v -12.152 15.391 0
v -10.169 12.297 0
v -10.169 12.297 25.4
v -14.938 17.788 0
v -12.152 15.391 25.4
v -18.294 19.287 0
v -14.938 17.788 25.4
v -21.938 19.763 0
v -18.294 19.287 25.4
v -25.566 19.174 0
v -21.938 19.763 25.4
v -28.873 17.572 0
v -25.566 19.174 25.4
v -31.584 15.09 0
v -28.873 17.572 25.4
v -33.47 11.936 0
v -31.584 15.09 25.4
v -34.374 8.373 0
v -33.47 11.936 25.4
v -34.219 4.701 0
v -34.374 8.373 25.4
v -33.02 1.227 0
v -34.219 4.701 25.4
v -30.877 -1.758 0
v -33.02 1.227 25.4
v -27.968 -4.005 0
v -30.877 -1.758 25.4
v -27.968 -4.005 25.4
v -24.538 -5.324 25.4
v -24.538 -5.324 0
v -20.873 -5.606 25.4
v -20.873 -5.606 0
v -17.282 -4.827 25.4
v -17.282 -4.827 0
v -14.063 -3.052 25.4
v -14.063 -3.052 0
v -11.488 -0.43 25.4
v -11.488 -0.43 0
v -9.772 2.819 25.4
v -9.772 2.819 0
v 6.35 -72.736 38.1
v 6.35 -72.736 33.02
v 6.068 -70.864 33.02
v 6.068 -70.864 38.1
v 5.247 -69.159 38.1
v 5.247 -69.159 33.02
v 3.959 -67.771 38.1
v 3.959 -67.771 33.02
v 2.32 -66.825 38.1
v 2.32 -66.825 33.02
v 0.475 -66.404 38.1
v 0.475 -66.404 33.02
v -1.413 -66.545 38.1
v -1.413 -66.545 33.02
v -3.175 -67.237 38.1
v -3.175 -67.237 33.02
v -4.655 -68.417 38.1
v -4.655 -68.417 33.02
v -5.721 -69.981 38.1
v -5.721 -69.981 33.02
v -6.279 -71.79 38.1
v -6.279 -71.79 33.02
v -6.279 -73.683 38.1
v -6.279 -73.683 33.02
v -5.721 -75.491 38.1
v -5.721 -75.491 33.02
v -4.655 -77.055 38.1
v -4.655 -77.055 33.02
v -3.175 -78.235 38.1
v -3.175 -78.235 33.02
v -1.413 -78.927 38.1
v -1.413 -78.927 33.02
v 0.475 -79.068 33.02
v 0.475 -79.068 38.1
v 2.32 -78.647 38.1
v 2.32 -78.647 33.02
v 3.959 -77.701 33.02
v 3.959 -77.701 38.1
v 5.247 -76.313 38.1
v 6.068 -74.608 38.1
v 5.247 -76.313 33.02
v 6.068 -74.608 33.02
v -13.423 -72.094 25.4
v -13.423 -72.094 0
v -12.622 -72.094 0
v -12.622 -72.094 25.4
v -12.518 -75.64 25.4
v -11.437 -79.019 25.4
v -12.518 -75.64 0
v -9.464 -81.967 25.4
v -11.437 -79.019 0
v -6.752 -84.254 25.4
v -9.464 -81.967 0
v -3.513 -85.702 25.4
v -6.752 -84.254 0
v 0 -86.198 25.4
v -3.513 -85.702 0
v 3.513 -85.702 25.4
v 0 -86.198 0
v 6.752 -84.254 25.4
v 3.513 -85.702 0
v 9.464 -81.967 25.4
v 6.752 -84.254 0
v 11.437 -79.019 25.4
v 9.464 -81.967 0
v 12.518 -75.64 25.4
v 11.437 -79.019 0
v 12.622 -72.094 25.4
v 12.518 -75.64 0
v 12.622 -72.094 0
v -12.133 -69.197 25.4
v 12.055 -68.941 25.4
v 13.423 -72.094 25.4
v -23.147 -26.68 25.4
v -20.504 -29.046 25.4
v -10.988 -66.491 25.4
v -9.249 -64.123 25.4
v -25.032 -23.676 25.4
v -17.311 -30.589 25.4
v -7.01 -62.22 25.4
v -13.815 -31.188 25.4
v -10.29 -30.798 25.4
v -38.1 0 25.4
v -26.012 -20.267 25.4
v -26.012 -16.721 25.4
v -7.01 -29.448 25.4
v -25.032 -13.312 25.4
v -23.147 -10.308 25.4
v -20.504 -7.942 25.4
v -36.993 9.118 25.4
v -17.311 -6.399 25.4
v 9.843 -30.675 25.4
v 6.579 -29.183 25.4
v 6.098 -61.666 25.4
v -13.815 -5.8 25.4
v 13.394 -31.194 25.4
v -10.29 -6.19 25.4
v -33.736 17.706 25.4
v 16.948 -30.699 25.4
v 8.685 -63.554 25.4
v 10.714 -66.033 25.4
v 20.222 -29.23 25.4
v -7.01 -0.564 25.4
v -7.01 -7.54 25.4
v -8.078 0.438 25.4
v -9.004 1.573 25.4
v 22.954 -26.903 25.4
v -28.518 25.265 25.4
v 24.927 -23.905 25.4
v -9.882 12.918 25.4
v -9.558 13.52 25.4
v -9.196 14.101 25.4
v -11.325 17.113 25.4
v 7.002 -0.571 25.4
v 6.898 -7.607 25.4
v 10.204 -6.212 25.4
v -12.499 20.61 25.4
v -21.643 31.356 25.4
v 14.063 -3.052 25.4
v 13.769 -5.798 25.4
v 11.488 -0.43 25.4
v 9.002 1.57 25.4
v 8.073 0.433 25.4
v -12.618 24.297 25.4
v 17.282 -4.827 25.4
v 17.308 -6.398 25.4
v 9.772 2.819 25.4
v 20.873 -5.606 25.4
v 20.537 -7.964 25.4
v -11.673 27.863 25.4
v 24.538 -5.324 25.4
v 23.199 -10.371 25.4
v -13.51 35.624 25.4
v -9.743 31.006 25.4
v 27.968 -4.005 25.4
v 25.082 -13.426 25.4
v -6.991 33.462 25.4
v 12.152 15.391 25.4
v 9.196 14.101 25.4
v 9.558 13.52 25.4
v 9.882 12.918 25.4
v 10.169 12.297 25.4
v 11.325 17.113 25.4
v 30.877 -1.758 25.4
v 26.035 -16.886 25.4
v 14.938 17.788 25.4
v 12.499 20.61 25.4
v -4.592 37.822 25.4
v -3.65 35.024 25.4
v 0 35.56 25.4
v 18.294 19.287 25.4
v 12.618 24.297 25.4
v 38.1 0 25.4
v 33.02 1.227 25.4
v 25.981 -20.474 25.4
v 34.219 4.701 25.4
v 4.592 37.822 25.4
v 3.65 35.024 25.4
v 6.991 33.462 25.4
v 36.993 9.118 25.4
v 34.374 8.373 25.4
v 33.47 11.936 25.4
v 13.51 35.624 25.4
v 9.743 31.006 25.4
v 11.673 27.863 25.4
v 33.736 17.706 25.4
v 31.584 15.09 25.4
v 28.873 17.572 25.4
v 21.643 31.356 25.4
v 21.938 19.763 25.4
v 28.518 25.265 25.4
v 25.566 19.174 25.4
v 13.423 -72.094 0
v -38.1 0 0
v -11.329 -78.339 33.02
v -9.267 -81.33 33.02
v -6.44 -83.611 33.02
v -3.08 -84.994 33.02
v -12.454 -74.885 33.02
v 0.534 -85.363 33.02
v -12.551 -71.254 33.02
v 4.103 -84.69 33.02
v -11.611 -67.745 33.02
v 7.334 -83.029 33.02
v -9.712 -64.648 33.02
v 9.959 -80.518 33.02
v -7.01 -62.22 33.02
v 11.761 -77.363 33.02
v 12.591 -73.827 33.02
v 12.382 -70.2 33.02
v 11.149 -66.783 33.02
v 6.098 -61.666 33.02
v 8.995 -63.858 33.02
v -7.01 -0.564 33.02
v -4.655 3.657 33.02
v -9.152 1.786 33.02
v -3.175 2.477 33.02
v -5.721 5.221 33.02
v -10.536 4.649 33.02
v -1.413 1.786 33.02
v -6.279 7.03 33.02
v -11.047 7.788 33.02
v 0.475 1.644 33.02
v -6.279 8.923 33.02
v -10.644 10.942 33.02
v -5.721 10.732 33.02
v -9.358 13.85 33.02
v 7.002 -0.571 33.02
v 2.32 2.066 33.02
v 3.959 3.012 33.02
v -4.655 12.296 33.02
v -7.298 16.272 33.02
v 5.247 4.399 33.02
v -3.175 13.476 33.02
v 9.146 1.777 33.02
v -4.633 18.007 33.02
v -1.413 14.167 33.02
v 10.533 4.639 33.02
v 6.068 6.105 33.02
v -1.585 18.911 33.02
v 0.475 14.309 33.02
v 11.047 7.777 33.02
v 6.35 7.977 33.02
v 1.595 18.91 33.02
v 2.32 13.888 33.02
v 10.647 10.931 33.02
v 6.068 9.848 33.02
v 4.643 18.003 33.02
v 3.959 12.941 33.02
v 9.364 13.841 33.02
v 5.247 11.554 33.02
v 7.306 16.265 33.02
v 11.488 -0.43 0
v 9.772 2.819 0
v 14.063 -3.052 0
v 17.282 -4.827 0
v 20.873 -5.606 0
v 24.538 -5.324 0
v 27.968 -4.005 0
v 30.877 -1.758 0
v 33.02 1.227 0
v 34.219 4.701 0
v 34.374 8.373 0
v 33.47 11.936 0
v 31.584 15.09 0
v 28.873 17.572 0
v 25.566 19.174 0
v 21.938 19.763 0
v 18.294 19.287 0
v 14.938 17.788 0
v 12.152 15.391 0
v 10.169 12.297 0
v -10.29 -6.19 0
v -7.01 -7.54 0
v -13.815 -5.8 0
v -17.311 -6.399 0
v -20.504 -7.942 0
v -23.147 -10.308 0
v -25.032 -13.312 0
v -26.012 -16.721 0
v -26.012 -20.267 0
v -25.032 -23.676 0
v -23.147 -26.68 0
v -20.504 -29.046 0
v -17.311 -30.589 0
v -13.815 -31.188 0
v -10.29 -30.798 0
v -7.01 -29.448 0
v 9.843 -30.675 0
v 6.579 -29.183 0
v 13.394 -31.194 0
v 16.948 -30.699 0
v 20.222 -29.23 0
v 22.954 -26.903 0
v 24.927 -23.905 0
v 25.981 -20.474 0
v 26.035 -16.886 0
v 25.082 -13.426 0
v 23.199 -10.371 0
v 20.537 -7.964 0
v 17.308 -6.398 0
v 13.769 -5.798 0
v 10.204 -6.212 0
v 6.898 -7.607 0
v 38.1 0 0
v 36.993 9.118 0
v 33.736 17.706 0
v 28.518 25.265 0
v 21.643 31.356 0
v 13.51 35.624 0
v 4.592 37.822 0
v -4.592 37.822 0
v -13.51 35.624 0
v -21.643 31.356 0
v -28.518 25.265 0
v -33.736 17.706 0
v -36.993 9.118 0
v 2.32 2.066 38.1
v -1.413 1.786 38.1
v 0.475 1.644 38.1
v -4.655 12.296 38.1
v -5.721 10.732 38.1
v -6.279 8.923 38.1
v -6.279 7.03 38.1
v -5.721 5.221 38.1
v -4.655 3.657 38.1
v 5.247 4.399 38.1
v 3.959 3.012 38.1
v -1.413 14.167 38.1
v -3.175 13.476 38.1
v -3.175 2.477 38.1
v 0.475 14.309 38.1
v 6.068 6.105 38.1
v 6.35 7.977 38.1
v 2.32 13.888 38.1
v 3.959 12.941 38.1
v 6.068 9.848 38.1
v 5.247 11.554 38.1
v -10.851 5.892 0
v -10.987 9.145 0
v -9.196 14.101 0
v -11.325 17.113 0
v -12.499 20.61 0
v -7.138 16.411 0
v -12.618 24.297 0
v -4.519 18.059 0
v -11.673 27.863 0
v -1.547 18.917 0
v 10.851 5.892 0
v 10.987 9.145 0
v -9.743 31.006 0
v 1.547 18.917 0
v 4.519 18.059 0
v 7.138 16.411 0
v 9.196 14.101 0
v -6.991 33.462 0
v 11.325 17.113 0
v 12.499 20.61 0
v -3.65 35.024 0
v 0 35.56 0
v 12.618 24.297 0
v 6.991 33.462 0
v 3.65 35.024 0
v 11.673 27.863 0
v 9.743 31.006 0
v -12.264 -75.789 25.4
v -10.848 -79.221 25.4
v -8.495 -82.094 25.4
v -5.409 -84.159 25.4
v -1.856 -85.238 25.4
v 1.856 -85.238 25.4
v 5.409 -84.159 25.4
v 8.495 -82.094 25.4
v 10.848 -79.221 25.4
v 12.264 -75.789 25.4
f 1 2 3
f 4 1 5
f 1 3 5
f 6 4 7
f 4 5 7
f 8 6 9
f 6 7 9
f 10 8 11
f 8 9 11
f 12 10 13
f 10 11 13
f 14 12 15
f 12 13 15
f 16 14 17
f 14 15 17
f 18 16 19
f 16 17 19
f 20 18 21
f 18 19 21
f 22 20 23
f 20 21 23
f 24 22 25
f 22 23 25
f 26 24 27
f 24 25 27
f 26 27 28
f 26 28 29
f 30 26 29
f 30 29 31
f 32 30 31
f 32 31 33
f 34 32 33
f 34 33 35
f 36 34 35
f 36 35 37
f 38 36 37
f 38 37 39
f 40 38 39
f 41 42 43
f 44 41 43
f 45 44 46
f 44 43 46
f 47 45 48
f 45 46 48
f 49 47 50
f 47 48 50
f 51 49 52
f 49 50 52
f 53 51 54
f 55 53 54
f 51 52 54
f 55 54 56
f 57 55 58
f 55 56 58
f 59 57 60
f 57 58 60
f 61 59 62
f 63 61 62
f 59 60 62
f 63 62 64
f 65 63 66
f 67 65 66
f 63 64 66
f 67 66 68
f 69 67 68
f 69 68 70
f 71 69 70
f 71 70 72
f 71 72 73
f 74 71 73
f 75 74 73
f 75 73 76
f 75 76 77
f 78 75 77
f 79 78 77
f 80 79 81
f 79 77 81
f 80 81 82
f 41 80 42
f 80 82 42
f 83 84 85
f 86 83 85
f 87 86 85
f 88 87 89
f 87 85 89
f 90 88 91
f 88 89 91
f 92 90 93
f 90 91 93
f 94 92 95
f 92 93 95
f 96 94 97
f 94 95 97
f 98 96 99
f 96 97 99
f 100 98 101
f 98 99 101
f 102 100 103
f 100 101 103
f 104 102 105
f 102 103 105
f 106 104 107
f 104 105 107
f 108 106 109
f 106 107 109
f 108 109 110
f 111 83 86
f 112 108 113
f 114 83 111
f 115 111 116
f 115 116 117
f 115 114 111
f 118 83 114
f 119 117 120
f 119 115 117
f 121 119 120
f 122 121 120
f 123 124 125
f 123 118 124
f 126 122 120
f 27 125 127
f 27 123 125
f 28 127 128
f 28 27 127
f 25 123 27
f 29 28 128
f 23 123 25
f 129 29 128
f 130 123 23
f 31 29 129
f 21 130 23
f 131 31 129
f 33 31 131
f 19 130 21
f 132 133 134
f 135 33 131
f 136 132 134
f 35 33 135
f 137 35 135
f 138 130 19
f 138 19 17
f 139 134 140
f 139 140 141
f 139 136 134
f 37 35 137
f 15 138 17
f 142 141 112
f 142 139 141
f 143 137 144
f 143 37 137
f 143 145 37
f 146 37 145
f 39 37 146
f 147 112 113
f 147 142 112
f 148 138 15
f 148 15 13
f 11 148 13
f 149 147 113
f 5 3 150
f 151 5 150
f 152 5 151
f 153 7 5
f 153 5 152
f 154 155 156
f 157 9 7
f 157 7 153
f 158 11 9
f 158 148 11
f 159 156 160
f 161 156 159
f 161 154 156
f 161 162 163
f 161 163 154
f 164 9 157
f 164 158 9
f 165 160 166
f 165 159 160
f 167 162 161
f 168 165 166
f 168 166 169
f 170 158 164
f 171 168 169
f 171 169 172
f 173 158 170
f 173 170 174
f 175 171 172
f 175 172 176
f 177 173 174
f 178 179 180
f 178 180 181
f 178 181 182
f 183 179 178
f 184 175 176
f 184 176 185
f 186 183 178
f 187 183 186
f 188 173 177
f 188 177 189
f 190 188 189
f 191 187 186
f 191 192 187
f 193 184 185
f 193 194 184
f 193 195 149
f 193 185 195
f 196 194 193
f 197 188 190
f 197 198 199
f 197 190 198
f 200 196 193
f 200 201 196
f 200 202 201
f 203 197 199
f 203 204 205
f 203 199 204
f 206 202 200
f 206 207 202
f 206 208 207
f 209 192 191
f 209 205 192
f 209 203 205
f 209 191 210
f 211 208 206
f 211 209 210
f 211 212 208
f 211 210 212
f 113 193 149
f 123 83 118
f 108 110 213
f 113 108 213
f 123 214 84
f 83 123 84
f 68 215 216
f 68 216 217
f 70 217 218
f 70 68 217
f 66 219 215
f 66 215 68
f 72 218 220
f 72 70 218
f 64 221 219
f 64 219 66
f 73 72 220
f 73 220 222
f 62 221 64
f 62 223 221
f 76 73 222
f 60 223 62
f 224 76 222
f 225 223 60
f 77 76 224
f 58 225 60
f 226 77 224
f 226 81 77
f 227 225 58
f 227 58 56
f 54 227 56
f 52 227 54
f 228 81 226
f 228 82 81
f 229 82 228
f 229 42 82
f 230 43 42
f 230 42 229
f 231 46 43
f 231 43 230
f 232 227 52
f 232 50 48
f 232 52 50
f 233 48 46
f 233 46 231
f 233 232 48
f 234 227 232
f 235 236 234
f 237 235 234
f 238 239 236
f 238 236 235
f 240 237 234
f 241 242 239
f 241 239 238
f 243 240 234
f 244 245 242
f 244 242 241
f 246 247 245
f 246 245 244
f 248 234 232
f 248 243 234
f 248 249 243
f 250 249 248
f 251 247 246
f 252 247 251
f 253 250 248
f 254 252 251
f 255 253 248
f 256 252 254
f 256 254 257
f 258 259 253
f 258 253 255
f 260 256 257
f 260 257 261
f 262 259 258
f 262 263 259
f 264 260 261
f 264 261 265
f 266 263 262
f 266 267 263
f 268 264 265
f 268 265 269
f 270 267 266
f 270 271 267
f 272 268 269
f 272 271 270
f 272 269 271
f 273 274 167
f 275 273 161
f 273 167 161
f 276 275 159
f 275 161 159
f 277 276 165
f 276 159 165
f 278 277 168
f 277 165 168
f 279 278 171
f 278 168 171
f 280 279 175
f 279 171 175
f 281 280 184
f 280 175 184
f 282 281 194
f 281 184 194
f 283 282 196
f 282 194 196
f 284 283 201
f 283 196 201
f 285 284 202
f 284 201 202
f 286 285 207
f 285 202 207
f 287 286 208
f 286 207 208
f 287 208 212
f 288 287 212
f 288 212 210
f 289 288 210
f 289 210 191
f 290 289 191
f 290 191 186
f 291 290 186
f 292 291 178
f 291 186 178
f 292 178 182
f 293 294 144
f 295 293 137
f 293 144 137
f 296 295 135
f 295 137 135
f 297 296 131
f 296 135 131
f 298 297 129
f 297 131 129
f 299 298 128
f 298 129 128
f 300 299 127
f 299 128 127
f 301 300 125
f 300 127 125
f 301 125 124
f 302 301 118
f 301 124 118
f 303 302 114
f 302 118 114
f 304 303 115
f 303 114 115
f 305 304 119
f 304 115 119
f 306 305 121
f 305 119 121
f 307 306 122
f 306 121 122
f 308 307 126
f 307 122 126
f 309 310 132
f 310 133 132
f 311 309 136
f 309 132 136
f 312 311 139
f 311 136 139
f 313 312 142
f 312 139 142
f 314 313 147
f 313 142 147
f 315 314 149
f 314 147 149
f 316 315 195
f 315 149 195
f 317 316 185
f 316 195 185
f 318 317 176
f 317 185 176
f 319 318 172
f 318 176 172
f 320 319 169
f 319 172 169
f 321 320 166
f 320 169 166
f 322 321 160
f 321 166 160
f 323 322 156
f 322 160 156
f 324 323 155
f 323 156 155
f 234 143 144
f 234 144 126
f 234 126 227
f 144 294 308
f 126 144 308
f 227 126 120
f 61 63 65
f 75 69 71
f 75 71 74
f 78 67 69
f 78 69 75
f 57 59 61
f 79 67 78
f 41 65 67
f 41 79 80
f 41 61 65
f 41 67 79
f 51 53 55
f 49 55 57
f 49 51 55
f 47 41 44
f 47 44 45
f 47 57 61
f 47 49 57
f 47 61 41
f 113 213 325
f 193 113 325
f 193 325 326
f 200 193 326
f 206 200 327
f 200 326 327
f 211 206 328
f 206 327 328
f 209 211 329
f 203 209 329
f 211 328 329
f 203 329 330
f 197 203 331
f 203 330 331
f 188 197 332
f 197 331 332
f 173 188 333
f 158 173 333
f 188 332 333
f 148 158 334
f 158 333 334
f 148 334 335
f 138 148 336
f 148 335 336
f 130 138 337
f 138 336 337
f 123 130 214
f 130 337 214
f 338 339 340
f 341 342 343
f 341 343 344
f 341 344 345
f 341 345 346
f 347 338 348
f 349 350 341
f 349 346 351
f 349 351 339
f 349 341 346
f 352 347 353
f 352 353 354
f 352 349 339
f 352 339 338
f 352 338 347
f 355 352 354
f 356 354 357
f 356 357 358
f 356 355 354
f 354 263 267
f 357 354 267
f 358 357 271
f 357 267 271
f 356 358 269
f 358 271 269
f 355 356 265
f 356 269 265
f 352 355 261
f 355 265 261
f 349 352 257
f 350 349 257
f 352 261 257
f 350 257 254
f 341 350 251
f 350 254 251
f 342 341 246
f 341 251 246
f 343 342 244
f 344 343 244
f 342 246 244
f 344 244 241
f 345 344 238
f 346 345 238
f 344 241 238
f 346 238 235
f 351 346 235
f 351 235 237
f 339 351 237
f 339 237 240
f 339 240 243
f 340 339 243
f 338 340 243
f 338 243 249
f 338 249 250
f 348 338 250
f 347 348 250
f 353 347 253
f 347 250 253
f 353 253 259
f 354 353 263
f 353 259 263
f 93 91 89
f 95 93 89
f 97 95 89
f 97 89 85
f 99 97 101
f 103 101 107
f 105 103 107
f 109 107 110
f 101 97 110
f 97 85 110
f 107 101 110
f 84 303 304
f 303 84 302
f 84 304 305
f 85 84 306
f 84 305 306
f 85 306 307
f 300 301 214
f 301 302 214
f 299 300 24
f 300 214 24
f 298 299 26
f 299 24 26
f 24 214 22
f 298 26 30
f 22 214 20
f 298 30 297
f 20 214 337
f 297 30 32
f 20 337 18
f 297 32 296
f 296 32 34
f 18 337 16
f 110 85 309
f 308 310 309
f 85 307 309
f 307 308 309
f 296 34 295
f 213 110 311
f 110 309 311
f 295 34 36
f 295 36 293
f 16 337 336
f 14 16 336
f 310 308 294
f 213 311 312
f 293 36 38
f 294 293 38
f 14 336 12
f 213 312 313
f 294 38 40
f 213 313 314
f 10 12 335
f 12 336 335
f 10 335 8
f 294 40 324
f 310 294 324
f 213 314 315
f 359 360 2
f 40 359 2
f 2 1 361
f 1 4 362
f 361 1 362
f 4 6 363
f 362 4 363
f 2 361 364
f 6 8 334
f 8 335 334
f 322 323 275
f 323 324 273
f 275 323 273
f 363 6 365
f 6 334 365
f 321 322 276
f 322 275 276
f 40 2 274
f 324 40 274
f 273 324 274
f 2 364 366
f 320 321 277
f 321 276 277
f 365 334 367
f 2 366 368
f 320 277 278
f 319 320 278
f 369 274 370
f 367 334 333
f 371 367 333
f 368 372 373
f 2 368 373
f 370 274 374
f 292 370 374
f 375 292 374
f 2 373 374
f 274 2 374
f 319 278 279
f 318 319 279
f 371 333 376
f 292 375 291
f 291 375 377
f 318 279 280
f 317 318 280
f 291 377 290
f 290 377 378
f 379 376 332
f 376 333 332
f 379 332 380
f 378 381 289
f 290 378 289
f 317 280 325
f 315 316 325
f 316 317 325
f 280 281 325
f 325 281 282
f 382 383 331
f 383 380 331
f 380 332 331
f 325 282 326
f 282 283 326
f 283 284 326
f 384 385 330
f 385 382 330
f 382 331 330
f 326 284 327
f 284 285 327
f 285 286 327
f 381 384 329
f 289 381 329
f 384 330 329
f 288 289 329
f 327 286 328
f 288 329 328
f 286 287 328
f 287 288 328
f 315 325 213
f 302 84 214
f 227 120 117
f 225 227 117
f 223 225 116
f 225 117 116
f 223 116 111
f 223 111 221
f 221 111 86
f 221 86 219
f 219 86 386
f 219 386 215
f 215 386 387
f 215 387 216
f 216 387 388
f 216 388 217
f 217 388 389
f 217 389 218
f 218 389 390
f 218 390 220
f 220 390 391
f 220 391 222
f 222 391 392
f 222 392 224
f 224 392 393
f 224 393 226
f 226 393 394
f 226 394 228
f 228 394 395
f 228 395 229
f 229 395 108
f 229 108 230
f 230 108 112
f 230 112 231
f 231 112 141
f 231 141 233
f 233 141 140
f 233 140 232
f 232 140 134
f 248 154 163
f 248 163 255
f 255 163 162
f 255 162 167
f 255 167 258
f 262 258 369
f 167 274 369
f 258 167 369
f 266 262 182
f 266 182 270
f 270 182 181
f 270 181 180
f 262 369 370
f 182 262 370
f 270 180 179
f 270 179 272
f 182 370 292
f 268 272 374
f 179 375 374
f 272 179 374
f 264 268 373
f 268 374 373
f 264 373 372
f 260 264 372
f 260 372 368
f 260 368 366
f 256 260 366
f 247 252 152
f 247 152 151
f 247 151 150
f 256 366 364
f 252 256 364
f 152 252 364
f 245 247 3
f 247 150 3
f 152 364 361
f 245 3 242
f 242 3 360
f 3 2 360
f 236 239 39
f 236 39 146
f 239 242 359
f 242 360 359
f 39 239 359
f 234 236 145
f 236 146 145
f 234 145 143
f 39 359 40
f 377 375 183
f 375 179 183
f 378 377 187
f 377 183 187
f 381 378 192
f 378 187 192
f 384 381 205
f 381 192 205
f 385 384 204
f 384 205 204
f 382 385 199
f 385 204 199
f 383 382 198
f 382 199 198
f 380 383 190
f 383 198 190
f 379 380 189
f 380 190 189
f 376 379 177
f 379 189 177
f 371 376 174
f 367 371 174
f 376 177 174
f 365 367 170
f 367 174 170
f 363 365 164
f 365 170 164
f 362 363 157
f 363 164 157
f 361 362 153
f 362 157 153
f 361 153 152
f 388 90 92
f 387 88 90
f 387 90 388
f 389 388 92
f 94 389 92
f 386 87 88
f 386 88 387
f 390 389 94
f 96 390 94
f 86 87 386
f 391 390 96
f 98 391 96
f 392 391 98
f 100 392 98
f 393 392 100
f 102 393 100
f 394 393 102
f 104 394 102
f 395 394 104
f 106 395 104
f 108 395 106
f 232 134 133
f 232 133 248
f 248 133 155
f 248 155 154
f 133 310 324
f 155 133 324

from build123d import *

# Parameters (mm, degrees)
F1_DEPTH  = 25.4
F2_R      = 12.7
F3_DEPTH  = 25.4
F4_R      = 12.7
F5_DEPTH  = 25.4
F6_DEPTH  = 25.4
F8_DEPTH  = 33.02
F9_R      = 6.35
F10_DEPTH = 5.08


with BuildPart() as f1:
    # F0 (on Top) → F1 (new body)
    with BuildSketch(Plane.XY):
        with BuildLine():
            Line((13.423362, -72.093714), (38.1, 0))
            ThreePointArc((38.1, 0), (0, 38.1), (-38.1, 0))
            Line((-38.1, 0), (-13.423362, -72.093714))
            Line((-13.423362, -72.093714), (-12.7, -72.093714))
            Line((-12.7, -72.093714), (-12.622174, -72.093714))
            ThreePointArc((-12.622174, -72.093714), (0, -86.197534), (12.622174, -72.093714))
            Line((12.622174, -72.093714), (12.7, -72.093714))
            Line((12.7, -72.093714), (13.423362, -72.093714))
        make_face()
    extrude(amount=F1_DEPTH)

    # F2 (on face) → F3 (cut)
    with BuildSketch(Plane.XY.offset(25.4)):
        with Locations((0, 22.86)):
            Circle(F2_R)
    extrude(amount=-F3_DEPTH, mode=Mode.SUBTRACT)

    # F4 (on face) → F5 (cut)
    with BuildSketch(Plane.XY.offset(25.4)):
        with Locations((-21.741152, 7.064128)):
            Circle(F4_R)
    extrude(amount=-F5_DEPTH, mode=Mode.SUBTRACT)

    # F4 (on face) → F6 (cut)
    with BuildSketch(Plane.XY.offset(25.4)):
        with Locations((0, 22.86)):
            Circle(F4_R)
        with Locations((-21.741152, 7.064128)):
            Circle(F4_R)
        with Locations((-13.436771, -18.494128)):
            Circle(F4_R)
        with Locations((13.436771, -18.494128)):
            Circle(F4_R)
        with Locations((21.741152, 7.064128)):
            Circle(F4_R)
    extrude(amount=-F6_DEPTH, mode=Mode.SUBTRACT)

    # F7 (on Top) → F8 (join)
    with BuildSketch(Plane.XY):
        with BuildLine():
            Line((-7.010239, -0.563764), (-7.010239, -62.219993))
            ThreePointArc((-7.010239, -62.219993), (0.533631, -85.363339), (6.098, -61.666034))
            Line((6.098, -61.666034), (7.001797, -0.570687))
            ThreePointArc((7.001797, -0.570687), (0.005459, 19.025547), (-7.010239, -0.563764))
        make_face()
    extrude(amount=F8_DEPTH)

    # F9 (on face) → F10 (join)
    with BuildSketch(Plane.XY.offset(33.02)):
        with Locations((0, 7.976549)):
            Circle(F9_R)
        with Locations((0, -72.736099)):
            Circle(F9_R)
    extrude(amount=F10_DEPTH)


solid = f1.part
